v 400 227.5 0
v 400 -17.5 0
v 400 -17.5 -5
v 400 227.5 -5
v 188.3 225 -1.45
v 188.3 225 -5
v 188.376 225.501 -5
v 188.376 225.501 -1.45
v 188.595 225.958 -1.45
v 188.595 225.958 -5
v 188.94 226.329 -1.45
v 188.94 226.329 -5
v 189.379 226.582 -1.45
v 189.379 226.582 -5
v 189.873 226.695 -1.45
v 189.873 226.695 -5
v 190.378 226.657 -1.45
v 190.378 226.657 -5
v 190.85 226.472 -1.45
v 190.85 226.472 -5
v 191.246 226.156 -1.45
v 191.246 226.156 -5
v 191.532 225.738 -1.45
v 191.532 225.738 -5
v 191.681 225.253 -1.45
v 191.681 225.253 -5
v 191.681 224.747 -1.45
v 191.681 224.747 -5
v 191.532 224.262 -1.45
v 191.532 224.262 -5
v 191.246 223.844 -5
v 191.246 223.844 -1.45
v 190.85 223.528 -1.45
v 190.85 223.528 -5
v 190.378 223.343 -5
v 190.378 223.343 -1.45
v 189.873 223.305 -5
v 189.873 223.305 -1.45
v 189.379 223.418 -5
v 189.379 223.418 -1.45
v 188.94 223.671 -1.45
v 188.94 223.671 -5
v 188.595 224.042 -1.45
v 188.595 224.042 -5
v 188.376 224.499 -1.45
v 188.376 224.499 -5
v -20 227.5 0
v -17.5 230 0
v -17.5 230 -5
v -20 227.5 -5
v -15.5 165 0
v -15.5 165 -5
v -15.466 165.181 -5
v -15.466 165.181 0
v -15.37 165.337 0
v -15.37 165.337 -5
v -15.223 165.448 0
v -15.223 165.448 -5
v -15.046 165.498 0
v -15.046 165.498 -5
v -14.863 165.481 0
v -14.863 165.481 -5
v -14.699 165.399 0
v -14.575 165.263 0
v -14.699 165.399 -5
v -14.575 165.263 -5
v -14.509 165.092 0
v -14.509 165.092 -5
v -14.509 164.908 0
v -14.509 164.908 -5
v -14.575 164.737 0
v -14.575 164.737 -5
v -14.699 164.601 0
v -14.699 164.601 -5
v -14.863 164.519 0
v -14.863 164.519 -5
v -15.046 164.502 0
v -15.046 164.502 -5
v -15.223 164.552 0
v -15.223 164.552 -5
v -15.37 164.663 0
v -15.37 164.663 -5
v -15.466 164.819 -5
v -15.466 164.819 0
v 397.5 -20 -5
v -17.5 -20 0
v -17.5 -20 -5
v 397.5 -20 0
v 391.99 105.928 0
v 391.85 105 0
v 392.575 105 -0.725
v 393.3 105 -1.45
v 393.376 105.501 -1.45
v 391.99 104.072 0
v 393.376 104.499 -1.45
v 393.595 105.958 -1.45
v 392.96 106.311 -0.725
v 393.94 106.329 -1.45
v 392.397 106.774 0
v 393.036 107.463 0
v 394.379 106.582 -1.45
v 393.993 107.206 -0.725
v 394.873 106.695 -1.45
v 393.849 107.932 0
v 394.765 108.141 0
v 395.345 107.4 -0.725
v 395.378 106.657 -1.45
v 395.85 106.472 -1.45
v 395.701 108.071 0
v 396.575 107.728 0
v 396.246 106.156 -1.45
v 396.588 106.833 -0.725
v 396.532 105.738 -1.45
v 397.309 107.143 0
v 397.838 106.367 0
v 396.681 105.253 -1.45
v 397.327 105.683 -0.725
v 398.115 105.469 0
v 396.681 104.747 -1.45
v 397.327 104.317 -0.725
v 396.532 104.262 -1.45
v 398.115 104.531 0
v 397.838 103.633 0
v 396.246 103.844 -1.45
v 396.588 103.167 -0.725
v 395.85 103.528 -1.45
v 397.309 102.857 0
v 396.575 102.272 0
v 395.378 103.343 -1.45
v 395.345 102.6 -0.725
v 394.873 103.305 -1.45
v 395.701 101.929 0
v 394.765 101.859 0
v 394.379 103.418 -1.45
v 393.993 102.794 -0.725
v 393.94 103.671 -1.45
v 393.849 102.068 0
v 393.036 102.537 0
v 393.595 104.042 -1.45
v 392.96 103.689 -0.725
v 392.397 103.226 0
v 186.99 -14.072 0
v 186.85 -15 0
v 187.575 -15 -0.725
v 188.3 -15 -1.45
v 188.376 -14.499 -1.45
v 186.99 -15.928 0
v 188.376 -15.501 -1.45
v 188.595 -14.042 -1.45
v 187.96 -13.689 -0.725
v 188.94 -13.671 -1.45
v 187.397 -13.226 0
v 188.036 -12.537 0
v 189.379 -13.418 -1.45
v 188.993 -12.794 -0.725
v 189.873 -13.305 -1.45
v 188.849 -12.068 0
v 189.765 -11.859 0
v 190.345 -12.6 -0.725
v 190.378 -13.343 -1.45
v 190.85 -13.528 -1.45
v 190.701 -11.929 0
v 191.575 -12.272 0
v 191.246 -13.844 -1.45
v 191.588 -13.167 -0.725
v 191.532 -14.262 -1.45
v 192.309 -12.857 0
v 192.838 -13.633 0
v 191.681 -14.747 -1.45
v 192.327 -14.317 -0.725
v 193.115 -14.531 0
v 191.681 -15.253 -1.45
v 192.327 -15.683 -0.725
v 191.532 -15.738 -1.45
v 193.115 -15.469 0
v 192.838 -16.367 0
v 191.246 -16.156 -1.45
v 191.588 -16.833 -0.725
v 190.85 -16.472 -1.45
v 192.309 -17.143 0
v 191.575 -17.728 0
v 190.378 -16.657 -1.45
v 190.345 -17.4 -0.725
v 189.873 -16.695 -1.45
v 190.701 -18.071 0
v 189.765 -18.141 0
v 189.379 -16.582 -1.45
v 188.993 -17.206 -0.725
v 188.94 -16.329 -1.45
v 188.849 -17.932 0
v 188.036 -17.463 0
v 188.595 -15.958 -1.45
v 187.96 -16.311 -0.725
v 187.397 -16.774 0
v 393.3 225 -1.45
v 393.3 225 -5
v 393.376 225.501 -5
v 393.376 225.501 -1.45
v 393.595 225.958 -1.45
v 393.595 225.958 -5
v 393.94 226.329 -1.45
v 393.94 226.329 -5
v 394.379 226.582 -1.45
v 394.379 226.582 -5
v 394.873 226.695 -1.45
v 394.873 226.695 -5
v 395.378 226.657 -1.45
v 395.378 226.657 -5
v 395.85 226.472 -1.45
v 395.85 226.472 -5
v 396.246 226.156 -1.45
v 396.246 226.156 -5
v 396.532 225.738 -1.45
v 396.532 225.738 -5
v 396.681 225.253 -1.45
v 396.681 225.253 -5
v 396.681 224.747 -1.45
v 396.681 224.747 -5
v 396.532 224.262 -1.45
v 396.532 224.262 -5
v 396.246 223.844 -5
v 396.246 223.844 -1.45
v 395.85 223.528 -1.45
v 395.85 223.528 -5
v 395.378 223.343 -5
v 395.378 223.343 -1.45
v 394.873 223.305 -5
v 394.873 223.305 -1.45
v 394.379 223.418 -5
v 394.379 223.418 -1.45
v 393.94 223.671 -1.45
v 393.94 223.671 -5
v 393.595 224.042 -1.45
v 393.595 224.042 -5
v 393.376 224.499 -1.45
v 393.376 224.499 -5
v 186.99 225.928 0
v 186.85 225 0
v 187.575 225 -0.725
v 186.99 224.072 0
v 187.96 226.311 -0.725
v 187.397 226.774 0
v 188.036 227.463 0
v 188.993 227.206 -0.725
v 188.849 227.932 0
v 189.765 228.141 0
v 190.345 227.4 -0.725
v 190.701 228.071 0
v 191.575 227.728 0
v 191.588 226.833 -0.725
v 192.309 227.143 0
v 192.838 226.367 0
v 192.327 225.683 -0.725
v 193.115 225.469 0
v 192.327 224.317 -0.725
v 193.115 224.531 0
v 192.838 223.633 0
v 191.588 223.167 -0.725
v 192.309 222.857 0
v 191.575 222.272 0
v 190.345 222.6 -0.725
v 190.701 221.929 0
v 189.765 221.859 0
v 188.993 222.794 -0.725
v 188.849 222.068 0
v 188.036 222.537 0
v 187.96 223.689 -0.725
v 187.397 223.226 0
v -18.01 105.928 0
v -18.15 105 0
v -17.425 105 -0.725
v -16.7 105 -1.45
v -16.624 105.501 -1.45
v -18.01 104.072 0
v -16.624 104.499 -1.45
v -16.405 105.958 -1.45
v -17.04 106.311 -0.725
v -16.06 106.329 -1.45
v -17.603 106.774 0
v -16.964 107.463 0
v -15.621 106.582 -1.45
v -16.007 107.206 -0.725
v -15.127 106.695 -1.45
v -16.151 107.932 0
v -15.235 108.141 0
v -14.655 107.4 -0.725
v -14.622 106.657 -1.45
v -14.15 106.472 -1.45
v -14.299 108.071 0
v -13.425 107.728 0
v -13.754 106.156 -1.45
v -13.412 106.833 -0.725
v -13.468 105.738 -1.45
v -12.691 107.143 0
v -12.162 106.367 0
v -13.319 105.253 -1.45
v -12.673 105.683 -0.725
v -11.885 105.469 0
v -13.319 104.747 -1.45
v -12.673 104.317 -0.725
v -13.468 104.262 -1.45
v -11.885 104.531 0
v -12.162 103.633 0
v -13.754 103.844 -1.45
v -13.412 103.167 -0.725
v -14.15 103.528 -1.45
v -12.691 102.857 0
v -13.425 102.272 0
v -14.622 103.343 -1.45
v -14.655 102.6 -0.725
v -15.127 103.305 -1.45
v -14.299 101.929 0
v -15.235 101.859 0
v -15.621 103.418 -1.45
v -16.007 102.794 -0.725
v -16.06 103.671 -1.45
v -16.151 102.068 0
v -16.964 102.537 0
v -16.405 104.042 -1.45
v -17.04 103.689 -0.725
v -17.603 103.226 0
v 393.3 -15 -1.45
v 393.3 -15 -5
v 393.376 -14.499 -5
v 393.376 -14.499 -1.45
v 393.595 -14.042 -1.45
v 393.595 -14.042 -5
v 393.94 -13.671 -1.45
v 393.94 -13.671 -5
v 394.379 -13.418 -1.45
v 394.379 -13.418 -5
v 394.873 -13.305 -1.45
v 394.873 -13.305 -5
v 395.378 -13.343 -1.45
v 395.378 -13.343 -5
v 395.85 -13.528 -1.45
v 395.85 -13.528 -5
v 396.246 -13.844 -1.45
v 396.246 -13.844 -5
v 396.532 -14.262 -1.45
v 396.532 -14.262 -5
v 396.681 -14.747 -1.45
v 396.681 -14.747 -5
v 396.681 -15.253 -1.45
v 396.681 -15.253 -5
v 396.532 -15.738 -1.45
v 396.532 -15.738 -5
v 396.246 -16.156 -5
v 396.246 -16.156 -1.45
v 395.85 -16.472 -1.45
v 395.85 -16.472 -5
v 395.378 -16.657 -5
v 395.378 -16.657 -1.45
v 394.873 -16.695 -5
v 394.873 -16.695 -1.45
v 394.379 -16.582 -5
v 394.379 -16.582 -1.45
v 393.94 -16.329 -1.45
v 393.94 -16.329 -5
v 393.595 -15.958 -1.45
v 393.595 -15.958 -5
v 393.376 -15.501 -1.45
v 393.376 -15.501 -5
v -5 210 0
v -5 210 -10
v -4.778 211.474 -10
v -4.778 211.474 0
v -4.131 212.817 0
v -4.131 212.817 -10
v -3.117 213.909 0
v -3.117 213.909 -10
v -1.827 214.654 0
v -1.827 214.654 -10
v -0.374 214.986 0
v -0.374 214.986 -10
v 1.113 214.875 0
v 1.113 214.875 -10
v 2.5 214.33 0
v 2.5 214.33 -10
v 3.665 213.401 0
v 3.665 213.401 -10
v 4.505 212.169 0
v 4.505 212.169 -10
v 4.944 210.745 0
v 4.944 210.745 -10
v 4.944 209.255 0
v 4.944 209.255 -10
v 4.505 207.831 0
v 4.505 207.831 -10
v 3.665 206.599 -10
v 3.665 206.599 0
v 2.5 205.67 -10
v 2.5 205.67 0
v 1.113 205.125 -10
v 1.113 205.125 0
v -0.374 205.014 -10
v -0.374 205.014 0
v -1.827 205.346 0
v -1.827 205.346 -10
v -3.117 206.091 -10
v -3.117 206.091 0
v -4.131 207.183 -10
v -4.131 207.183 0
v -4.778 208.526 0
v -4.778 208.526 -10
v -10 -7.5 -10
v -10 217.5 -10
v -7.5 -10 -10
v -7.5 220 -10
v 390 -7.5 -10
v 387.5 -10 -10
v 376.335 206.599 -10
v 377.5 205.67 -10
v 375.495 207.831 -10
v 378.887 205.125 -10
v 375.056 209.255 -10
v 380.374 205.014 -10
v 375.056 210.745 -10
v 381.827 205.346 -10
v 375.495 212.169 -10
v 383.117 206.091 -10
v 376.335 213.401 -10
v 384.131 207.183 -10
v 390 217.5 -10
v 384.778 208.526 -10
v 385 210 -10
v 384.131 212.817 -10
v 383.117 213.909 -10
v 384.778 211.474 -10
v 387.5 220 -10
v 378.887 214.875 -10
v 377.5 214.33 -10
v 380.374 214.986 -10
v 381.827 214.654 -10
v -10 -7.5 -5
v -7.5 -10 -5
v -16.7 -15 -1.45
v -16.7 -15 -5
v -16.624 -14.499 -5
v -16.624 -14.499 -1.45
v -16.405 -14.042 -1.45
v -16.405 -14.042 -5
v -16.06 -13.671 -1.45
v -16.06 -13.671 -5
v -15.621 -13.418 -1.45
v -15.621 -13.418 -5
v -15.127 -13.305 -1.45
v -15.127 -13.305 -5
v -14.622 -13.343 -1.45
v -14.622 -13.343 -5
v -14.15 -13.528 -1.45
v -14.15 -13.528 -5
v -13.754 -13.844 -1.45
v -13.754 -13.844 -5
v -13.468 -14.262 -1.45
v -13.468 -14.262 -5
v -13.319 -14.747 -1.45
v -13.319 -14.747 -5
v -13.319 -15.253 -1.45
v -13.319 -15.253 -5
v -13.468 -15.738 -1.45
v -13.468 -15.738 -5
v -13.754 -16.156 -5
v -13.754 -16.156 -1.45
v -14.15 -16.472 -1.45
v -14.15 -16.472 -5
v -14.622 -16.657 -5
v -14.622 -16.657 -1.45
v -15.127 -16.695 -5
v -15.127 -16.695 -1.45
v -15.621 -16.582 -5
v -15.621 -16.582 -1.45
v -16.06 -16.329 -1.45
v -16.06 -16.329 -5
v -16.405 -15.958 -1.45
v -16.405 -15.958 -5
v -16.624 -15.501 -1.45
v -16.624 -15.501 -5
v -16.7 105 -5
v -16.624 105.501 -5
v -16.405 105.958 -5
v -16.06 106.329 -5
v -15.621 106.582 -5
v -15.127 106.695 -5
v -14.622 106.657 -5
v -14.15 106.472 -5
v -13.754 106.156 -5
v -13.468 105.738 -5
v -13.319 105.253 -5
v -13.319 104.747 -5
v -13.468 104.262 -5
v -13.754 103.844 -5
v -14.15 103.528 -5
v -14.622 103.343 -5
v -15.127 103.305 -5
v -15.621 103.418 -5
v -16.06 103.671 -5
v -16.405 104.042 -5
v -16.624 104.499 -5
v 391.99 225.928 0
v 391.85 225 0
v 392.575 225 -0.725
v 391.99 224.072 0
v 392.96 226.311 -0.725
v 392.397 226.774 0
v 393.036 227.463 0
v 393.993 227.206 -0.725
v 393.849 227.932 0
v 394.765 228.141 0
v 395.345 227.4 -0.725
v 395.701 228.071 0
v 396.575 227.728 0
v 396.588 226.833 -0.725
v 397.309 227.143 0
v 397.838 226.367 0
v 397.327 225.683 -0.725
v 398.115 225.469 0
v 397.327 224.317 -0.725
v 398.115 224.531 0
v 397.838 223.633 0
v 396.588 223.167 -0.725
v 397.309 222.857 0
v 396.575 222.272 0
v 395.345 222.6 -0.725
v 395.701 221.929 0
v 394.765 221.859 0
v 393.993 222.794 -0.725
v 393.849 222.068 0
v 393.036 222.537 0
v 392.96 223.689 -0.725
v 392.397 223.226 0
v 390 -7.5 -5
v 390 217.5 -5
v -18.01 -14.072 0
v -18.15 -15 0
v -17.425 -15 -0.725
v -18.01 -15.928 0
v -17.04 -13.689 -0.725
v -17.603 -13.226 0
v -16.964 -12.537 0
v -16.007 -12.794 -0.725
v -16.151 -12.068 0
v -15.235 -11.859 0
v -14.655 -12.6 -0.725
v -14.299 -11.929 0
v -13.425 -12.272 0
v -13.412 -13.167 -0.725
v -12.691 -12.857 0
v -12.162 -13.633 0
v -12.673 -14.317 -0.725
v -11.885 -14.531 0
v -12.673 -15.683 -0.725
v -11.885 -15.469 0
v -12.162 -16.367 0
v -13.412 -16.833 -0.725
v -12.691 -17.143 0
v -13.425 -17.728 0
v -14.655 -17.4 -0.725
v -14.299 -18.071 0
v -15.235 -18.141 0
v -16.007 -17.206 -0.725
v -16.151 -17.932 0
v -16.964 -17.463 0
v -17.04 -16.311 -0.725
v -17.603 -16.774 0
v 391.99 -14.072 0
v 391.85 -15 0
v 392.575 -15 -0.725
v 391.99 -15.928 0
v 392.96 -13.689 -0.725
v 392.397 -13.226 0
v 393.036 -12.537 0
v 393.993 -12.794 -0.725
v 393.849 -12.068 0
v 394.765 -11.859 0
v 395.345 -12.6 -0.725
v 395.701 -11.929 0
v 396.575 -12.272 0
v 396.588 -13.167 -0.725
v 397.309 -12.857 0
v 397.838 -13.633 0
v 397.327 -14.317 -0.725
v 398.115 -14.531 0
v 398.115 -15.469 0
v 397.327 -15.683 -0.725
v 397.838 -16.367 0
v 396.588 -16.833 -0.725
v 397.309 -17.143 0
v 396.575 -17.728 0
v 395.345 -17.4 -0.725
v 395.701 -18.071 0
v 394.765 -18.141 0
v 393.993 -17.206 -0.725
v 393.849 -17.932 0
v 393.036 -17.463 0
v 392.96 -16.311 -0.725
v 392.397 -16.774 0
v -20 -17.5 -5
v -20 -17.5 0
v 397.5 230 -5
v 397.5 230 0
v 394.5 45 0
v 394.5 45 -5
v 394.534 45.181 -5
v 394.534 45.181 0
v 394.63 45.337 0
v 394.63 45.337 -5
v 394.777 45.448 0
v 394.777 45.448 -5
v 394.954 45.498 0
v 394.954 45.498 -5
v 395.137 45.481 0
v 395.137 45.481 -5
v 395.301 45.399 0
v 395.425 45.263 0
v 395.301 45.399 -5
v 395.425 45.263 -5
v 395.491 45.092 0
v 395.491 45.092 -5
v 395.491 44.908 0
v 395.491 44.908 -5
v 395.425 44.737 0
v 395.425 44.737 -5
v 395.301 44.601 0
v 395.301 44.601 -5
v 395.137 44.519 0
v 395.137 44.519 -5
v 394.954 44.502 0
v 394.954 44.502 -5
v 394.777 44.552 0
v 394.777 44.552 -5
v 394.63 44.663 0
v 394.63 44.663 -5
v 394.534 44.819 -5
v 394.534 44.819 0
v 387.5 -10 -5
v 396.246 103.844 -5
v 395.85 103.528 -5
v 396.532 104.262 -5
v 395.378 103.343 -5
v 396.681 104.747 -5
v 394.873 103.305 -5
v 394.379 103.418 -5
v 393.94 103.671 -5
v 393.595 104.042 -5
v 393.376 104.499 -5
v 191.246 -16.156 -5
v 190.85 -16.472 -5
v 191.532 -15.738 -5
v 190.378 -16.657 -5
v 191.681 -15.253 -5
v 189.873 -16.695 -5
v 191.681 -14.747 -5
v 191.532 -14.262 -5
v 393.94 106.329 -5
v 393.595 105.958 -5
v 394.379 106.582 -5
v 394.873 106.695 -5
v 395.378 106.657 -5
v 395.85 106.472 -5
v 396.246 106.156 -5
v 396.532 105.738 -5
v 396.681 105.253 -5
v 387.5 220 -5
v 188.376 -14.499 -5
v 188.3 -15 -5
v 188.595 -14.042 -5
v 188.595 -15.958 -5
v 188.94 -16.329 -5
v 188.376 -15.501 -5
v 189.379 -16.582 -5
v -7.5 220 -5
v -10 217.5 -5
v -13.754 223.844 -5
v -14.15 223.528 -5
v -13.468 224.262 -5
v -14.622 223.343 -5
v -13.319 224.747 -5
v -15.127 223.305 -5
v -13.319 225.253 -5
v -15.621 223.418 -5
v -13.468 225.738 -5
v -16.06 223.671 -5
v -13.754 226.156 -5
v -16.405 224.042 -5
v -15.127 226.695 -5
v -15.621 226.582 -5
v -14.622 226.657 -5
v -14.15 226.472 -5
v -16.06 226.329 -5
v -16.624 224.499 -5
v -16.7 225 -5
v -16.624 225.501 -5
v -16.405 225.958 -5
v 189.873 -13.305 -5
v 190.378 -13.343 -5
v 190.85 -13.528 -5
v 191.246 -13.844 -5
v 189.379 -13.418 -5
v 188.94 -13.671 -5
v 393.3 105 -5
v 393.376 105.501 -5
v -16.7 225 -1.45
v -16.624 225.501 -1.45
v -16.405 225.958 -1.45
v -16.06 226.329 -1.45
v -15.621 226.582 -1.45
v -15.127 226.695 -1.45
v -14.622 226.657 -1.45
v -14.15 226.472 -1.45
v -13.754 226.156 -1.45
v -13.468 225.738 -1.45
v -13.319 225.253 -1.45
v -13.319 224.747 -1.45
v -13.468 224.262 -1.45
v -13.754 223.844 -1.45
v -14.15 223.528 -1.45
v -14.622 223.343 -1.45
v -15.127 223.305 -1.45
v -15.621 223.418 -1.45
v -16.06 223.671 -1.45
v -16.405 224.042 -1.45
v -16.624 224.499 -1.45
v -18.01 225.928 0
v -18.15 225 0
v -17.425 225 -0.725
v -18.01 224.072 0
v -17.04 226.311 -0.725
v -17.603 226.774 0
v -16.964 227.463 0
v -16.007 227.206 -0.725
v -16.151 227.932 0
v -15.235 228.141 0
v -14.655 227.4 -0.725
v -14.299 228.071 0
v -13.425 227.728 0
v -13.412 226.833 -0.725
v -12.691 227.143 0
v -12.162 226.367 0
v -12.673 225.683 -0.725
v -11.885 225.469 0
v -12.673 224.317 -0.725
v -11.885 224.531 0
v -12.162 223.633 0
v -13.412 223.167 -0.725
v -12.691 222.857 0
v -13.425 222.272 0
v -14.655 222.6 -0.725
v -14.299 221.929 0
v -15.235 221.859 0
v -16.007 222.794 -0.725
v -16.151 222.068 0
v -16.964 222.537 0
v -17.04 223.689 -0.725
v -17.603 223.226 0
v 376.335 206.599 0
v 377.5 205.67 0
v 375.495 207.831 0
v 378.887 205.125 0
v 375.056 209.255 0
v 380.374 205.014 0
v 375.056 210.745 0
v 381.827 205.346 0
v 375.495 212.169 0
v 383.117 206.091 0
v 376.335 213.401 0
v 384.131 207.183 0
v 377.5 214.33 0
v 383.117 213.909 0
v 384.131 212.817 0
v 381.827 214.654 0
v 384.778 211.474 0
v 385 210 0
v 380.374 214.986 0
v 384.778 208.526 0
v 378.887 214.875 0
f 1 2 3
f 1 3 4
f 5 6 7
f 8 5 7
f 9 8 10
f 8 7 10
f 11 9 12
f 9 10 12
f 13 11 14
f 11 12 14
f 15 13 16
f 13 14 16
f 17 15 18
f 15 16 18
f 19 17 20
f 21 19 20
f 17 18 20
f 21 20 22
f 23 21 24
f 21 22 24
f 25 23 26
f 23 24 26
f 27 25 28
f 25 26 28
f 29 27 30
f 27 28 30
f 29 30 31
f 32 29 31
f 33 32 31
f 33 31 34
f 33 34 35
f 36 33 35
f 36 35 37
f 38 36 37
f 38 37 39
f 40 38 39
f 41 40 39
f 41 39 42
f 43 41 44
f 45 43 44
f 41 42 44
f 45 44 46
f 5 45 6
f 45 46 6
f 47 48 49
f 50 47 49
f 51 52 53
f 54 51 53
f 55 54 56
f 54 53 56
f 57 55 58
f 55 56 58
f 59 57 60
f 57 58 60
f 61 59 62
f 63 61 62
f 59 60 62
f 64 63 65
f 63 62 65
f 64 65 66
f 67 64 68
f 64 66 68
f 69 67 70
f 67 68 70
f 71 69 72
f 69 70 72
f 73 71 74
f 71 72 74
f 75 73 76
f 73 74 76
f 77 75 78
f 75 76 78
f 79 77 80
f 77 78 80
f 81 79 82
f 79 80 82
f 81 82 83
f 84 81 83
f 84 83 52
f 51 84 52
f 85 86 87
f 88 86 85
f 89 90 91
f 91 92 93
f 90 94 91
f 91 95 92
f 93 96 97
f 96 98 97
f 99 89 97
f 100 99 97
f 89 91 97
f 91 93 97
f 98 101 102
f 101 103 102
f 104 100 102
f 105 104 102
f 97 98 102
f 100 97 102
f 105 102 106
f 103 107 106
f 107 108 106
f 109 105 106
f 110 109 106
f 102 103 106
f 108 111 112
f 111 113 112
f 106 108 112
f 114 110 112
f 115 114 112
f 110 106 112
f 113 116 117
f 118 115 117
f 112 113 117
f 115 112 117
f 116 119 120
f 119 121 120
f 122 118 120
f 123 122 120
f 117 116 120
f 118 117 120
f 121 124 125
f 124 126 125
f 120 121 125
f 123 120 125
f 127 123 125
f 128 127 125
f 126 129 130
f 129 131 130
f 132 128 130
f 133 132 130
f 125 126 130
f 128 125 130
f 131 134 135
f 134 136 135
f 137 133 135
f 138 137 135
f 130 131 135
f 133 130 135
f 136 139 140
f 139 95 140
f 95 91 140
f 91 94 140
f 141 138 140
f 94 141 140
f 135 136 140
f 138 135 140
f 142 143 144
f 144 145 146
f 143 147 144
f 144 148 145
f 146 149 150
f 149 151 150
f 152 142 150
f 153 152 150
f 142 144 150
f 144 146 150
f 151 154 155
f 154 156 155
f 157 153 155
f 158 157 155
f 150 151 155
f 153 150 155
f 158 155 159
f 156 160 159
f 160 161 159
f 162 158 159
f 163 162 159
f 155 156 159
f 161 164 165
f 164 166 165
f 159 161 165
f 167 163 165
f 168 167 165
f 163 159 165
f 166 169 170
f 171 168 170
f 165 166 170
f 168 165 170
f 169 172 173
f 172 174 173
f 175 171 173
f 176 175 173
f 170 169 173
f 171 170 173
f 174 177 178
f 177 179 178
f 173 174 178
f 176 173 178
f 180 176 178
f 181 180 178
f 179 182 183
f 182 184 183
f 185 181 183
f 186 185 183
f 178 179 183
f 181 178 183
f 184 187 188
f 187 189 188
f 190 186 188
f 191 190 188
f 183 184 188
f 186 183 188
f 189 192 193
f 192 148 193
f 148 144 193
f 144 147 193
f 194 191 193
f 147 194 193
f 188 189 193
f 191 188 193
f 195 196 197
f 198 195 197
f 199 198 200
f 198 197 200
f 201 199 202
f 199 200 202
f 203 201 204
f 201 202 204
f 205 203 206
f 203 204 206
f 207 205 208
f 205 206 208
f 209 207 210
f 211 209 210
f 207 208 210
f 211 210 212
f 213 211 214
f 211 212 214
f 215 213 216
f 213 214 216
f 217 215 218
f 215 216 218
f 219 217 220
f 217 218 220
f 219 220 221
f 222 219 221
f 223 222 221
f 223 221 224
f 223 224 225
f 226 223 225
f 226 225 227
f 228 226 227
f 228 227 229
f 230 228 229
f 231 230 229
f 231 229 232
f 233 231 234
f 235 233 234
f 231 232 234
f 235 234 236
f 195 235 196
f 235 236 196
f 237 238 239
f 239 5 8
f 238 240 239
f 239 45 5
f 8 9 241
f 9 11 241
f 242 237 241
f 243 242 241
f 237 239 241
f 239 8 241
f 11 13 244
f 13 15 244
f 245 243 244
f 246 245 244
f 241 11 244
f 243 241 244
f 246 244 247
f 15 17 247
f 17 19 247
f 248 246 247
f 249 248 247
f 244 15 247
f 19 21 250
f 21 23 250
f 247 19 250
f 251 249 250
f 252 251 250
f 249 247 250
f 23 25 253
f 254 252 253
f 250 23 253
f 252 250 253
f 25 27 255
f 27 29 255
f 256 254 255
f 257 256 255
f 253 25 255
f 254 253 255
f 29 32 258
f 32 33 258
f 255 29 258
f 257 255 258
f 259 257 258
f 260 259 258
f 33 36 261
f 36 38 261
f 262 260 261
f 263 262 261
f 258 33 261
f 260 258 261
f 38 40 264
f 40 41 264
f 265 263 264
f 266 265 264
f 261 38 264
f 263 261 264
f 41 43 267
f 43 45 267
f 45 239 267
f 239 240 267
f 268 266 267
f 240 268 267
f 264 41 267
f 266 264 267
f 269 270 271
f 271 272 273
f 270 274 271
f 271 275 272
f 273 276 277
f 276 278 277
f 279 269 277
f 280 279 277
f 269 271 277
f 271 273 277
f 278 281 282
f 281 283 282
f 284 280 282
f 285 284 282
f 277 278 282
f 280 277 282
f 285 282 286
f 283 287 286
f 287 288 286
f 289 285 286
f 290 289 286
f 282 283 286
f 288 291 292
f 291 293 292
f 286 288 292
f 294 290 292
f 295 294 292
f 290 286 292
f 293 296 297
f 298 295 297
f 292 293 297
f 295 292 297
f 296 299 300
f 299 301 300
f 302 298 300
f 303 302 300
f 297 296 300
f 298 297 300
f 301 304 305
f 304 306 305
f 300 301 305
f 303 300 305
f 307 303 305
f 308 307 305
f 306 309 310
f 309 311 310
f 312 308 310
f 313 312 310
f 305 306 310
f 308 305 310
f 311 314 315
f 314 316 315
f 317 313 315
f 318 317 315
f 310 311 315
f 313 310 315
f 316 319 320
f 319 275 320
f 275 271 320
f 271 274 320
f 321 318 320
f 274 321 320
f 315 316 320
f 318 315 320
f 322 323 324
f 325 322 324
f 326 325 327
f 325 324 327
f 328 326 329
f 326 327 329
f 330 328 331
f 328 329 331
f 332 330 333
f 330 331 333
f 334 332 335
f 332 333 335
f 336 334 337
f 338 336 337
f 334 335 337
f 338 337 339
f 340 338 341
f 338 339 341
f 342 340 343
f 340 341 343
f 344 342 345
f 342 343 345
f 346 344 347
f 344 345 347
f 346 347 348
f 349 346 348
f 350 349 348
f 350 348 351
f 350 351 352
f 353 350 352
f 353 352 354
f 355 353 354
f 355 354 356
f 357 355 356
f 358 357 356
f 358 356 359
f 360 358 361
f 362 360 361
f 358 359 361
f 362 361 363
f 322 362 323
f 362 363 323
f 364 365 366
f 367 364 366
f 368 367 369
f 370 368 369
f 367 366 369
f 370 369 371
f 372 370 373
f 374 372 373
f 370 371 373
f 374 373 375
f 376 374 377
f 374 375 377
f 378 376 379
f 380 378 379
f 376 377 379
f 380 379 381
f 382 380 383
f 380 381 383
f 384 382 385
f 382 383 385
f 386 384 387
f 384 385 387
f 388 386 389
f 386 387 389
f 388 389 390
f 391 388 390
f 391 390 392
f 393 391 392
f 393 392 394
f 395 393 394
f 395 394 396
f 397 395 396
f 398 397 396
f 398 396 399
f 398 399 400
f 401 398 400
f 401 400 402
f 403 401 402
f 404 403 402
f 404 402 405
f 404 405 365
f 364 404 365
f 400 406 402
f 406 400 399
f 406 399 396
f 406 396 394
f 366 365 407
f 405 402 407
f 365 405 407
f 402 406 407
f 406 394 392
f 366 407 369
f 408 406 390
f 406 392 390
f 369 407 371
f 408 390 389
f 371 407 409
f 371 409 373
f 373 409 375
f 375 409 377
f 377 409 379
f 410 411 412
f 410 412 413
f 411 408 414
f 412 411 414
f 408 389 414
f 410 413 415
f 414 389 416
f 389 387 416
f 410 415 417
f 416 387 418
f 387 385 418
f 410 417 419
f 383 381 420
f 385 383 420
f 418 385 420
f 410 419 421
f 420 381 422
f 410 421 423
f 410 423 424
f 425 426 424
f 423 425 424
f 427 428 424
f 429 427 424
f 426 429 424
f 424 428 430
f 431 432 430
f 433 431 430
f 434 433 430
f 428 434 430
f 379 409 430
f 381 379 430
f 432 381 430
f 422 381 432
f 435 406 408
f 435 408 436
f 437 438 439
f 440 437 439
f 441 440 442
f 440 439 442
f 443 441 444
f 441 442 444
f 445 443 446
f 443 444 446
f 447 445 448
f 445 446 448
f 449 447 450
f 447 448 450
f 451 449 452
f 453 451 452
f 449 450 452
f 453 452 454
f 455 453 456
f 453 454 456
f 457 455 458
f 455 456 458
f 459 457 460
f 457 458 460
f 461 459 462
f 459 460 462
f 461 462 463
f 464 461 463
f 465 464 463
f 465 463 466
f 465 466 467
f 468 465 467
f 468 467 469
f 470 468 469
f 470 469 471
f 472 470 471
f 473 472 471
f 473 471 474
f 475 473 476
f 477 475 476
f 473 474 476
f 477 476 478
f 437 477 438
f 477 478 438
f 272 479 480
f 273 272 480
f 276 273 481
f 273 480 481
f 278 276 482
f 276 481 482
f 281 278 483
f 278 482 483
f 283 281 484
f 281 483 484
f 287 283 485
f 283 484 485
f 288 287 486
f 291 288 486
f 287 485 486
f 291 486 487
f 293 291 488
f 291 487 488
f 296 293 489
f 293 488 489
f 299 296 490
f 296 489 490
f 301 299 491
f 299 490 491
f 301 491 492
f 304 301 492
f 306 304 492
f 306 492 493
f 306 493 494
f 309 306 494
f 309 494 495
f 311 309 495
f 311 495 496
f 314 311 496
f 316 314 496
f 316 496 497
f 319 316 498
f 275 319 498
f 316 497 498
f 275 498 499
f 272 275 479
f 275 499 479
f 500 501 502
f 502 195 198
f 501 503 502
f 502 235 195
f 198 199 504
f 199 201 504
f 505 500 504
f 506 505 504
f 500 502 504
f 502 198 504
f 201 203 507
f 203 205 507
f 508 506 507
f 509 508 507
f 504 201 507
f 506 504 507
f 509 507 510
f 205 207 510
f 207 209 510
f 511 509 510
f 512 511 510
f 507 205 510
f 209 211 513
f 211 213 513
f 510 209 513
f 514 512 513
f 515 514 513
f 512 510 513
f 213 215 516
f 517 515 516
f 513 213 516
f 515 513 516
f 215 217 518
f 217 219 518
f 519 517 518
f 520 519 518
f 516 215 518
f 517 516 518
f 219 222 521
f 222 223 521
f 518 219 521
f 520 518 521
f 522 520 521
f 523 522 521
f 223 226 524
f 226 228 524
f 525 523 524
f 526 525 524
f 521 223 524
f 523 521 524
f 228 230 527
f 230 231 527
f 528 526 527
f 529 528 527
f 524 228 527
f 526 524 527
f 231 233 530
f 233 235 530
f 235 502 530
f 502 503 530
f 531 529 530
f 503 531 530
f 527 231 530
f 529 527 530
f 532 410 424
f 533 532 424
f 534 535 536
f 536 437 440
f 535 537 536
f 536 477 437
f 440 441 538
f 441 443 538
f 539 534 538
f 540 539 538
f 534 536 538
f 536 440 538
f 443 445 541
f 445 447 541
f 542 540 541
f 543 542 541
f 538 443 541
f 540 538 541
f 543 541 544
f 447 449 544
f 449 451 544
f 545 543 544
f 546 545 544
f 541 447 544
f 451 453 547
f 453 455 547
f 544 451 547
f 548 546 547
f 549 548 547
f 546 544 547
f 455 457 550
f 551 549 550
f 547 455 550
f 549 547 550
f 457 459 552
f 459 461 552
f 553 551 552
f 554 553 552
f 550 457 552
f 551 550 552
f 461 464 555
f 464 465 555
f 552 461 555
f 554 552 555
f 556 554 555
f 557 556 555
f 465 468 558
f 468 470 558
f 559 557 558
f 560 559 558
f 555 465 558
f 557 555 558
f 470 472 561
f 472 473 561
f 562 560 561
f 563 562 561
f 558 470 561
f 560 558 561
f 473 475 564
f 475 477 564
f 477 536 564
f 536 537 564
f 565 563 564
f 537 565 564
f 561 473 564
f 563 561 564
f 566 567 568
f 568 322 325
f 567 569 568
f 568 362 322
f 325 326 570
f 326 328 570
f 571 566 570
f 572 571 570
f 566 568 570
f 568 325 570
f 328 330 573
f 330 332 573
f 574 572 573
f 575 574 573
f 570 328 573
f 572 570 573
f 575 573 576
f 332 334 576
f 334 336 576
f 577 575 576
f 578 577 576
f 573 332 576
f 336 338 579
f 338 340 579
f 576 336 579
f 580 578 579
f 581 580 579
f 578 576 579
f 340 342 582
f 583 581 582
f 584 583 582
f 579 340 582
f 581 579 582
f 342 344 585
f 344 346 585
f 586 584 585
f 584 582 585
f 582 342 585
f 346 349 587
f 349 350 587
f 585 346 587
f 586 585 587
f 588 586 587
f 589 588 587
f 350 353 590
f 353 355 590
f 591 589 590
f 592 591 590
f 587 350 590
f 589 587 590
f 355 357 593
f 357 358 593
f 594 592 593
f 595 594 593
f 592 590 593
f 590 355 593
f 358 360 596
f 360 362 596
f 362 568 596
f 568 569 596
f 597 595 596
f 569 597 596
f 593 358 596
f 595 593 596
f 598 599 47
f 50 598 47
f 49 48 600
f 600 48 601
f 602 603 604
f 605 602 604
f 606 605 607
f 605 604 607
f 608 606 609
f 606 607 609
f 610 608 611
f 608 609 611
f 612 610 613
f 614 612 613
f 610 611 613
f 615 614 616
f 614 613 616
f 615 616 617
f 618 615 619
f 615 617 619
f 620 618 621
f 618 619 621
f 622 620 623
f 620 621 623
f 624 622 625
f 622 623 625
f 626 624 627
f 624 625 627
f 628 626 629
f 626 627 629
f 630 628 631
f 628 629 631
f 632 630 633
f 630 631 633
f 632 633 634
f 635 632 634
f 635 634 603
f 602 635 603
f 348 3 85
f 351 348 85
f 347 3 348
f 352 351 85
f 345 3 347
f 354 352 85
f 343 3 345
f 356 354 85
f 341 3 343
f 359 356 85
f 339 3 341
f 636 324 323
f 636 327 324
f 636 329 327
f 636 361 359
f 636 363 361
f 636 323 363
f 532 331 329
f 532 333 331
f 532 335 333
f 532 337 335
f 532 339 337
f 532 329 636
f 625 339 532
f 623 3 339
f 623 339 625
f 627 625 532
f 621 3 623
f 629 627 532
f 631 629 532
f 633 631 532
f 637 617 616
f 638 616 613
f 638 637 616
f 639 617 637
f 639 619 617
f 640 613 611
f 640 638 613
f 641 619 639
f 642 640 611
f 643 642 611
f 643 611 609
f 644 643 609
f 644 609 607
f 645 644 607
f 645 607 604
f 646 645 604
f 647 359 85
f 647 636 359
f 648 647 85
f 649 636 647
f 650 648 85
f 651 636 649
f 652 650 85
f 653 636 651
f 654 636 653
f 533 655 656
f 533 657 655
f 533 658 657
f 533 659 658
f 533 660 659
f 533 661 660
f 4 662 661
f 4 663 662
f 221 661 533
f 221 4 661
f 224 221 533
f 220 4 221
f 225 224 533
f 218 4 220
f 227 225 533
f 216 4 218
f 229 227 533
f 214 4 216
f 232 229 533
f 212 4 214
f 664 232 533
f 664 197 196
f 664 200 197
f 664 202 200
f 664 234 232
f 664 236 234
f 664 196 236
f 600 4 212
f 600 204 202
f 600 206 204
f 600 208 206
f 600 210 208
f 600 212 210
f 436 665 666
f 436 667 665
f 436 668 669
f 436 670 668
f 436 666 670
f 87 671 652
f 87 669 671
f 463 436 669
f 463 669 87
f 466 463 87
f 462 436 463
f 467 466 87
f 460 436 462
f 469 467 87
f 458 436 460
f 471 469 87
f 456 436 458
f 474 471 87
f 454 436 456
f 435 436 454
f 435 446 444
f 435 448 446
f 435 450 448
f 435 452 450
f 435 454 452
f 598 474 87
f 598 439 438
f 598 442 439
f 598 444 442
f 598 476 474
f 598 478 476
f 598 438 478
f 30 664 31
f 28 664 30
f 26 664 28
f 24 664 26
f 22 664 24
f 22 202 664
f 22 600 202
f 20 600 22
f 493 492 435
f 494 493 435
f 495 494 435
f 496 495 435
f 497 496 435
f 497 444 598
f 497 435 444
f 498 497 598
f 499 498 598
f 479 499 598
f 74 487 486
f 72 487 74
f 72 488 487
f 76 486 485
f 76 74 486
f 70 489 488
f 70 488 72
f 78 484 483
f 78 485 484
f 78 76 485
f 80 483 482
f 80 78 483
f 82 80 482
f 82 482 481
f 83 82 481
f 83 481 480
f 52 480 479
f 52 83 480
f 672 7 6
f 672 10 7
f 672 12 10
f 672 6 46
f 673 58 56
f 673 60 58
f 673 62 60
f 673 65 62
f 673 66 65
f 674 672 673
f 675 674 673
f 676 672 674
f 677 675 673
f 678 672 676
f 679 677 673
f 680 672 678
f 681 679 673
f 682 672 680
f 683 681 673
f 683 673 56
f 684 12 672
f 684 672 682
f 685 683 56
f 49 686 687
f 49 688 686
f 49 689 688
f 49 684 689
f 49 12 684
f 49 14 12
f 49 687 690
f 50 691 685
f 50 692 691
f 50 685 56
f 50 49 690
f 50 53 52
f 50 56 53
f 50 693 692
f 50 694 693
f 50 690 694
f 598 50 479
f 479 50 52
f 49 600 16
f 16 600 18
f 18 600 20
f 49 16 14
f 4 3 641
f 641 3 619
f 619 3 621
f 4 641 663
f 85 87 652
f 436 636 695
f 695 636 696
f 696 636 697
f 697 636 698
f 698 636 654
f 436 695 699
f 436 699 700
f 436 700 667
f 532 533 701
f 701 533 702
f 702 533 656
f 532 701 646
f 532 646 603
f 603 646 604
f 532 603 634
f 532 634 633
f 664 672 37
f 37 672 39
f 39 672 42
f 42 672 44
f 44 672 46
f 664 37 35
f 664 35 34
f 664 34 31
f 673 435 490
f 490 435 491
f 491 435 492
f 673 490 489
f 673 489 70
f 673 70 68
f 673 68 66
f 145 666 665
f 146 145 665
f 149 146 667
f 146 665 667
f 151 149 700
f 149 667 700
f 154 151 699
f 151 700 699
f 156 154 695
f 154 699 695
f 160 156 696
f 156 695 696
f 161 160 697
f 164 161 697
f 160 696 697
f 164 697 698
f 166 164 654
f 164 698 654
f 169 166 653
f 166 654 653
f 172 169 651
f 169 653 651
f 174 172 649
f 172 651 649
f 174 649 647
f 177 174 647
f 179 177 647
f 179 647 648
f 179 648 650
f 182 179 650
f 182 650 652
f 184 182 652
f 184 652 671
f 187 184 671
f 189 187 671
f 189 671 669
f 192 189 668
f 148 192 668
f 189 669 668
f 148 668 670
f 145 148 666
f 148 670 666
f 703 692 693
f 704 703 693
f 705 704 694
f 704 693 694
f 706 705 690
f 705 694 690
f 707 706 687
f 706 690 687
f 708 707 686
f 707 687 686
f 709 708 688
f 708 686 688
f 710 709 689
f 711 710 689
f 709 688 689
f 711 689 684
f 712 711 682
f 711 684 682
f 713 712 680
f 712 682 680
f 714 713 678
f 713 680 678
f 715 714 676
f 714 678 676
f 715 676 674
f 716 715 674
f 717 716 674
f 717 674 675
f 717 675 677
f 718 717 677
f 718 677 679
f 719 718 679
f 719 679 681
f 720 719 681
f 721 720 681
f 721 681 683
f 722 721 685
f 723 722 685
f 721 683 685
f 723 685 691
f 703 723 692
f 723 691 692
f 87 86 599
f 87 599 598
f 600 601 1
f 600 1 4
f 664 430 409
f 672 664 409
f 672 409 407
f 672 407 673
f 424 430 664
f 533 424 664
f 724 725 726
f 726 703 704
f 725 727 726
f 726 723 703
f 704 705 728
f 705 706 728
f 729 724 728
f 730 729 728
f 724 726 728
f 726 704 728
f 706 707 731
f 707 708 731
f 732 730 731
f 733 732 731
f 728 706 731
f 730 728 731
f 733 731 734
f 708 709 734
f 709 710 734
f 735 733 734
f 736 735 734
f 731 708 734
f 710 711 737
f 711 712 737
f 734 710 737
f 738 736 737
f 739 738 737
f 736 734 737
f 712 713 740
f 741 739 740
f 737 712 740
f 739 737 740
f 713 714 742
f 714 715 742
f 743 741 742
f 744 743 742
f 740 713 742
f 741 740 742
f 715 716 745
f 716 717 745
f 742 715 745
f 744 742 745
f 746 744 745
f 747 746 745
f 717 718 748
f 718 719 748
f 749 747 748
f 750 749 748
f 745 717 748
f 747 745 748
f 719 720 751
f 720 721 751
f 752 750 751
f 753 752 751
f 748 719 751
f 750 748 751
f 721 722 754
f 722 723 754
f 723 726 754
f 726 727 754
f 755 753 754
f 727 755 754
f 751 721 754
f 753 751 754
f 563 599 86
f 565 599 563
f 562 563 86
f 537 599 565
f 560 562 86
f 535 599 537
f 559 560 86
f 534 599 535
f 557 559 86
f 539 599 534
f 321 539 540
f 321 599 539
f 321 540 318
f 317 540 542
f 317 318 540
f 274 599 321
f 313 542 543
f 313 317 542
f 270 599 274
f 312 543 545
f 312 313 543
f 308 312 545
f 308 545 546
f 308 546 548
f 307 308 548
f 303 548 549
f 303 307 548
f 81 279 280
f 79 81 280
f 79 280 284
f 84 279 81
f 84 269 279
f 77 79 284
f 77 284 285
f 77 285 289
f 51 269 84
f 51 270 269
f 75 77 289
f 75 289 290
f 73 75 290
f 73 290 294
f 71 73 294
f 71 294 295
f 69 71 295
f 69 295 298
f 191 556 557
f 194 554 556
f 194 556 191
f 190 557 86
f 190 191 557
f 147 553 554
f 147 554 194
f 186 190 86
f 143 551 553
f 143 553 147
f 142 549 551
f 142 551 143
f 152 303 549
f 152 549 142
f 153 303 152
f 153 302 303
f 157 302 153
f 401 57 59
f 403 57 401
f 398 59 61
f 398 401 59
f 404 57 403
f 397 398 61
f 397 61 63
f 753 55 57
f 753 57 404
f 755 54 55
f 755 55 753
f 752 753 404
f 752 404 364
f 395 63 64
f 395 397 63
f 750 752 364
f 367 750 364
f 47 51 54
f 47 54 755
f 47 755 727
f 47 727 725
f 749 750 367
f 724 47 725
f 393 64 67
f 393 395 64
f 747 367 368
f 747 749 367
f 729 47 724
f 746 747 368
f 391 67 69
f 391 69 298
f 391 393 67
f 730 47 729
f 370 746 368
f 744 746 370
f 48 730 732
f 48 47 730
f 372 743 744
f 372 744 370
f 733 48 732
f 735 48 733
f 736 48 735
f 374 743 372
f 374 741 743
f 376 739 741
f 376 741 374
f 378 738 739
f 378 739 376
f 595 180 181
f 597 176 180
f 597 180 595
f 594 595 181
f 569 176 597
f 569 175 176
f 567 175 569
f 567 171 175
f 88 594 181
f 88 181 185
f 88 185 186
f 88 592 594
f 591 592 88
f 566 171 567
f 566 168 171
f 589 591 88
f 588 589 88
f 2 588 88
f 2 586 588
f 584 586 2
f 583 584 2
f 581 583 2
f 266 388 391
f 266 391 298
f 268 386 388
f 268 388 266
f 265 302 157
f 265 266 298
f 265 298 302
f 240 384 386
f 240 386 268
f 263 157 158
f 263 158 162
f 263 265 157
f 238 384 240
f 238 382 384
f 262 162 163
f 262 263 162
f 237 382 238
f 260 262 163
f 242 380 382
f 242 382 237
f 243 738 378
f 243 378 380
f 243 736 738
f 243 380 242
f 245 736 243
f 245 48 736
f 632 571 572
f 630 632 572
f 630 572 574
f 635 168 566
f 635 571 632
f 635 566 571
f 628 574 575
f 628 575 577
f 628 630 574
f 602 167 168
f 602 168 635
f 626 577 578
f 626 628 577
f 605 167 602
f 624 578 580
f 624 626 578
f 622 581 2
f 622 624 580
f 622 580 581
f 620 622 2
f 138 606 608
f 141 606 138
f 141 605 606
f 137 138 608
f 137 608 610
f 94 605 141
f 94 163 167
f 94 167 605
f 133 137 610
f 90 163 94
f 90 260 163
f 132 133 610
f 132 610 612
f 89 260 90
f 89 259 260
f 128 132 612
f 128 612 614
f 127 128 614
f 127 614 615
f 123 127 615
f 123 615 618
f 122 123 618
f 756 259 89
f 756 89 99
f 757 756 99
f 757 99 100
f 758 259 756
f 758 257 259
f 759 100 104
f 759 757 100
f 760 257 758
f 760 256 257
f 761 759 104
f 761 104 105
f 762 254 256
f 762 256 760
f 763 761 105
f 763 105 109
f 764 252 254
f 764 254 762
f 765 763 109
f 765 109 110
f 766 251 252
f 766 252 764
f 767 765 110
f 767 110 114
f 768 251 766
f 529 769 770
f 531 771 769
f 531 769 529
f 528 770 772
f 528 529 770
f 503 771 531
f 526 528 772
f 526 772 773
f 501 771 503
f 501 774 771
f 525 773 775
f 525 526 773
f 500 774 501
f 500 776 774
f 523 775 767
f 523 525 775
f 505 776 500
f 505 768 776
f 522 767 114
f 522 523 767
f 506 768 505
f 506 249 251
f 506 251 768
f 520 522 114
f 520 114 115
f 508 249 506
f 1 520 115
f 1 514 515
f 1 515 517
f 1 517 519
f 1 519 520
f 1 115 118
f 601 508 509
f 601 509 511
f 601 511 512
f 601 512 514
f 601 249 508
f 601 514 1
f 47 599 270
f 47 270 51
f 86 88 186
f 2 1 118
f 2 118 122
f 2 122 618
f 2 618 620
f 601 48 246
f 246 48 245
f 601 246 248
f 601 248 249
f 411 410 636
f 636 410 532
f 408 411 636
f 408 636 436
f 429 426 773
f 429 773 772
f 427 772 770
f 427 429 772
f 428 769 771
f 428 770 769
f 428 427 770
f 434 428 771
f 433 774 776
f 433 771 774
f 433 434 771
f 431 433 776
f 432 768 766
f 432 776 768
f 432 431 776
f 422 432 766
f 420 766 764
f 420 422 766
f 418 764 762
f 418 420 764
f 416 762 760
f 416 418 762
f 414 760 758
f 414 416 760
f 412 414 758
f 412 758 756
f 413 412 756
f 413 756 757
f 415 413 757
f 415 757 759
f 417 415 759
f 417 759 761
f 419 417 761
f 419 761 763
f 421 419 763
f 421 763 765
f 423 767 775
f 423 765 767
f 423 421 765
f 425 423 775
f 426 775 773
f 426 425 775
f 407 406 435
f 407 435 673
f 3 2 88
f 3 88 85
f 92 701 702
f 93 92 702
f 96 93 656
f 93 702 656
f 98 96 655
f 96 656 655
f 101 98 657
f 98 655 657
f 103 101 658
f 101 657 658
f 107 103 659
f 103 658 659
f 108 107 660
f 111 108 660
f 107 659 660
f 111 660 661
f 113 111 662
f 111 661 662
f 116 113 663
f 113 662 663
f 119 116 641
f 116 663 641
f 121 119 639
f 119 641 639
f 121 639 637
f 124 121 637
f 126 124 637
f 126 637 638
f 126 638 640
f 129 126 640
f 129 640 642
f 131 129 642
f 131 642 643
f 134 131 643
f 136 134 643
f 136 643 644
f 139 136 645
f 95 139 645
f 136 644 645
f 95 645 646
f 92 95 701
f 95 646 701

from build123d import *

# Parameters (mm, degrees)
SKETCH1_W                                       = 420
SKETCH1_H                                       = 250
BOSS_EXTRUDE1_DEPTH                             = 10
CHAMFER1_SIZE                                   = 2.5
CSK_FOR_M3_FLAT_HEAD_MACHINE_SCREW2_D           = 3.4
CSK_FOR_M3_FLAT_HEAD_MACHINE_SCREW2_DEPTH       = 15
CSK_FOR_M3_FLAT_HEAD_MACHINE_SCREW2_CSINK_D     = 6.3
CSK_FOR_M3_FLAT_HEAD_MACHINE_SCREW2_CSINK_ANGLE = 90
CSK_FOR_M3_FLAT_HEAD_MACHINE_SCREW2_TIP         = 1.021463052
SKETCH7_OUTSIDE_W                               = 519.776
SKETCH7_OUTSIDE_H                               = 349.776
SKETCH7_OUTSIDE_W_2                             = 400
SKETCH7_OUTSIDE_H_2                             = 230
CUT_EXTRUDE2_DEPTH                              = 5
CHAMFER2_SIZE                                   = 2.5
F_10_0MM_DOWEL_HOLE1_D                          = 10
F_1_0MM_DOWEL_HOLE1_D                           = 1


with BuildPart() as part:
    # Sketch1 → Boss-Extrude1 (new body)
    with BuildSketch(Plane.XY):
        with Locations((190, 105)):
            Rectangle(SKETCH1_W, SKETCH1_H)
    extrude(amount=-BOSS_EXTRUDE1_DEPTH)

    # Chamfer1
    chamfer1_edges = [part.edges().sort_by_distance(p)[0] for p in [
        (-20, 230, -5),
        (400, 230, -5),
        (400, -20, -5),
        (-20, -20, -5),
    ]]
    chamfer(chamfer1_edges, length=CHAMFER1_SIZE)

    # CSK for M3 Flat Head Machine Screw2
    with Locations(Plane.XY):
        with Locations((-15, 225), (190, 225), (395, 225), (395, -15), (190, -15), (-15, -15), (-15, 105), (395, 105)):
            CounterSinkHole(CSK_FOR_M3_FLAT_HEAD_MACHINE_SCREW2_D / 2, CSK_FOR_M3_FLAT_HEAD_MACHINE_SCREW2_CSINK_D / 2, depth=CSK_FOR_M3_FLAT_HEAD_MACHINE_SCREW2_DEPTH, counter_sink_angle=CSK_FOR_M3_FLAT_HEAD_MACHINE_SCREW2_CSINK_ANGLE)
            with Locations((0, 0, -(CSK_FOR_M3_FLAT_HEAD_MACHINE_SCREW2_DEPTH + CSK_FOR_M3_FLAT_HEAD_MACHINE_SCREW2_TIP / 2))):  # 118° drill point
                Cone(0, CSK_FOR_M3_FLAT_HEAD_MACHINE_SCREW2_D / 2, CSK_FOR_M3_FLAT_HEAD_MACHINE_SCREW2_TIP, mode=Mode.SUBTRACT)

    # Sketch7 outside → Cut-Extrude2 (cut)
    with BuildSketch(Plane(origin=(0, 0, -10), x_dir=(-1, 0, 0), z_dir=(0, 0, -1))):
        with Locations((-190, 105)):
            Rectangle(SKETCH7_OUTSIDE_W, SKETCH7_OUTSIDE_H)
        with Locations((-190, 105)):
            Rectangle(SKETCH7_OUTSIDE_W_2, SKETCH7_OUTSIDE_H_2, mode=Mode.SUBTRACT)
    extrude(amount=-CUT_EXTRUDE2_DEPTH, mode=Mode.SUBTRACT)

    # Chamfer2
    chamfer2_edges = [part.edges().sort_by_distance(p)[0] for p in [
        (-10, -10, -7.5),
        (390, -10, -7.5),
        (390, 220, -7.5),
        (-10, 220, -7.5),
    ]]
    chamfer(chamfer2_edges, length=CHAMFER2_SIZE)

    # Ø10.0mm Dowel Hole1 (through all)
    with Locations(Plane.XY):
        with Locations((0, 210)):
            f_10_0mm_dowel_hole1 = Hole(F_10_0MM_DOWEL_HOLE1_D / 2)

    # Mirror1: Ø10.0mm Dowel Hole1 across plane
    add(f_10_0mm_dowel_hole1.mirror(Plane.ZY.offset(-190)), mode=Mode.SUBTRACT)

    # Ø1.0mm Dowel Hole1 (through all)
    with Locations(Plane.XY):
        with Locations((-15, 165), (395, 45)):
            Hole(F_1_0MM_DOWEL_HOLE1_D / 2)


solid = part.part
